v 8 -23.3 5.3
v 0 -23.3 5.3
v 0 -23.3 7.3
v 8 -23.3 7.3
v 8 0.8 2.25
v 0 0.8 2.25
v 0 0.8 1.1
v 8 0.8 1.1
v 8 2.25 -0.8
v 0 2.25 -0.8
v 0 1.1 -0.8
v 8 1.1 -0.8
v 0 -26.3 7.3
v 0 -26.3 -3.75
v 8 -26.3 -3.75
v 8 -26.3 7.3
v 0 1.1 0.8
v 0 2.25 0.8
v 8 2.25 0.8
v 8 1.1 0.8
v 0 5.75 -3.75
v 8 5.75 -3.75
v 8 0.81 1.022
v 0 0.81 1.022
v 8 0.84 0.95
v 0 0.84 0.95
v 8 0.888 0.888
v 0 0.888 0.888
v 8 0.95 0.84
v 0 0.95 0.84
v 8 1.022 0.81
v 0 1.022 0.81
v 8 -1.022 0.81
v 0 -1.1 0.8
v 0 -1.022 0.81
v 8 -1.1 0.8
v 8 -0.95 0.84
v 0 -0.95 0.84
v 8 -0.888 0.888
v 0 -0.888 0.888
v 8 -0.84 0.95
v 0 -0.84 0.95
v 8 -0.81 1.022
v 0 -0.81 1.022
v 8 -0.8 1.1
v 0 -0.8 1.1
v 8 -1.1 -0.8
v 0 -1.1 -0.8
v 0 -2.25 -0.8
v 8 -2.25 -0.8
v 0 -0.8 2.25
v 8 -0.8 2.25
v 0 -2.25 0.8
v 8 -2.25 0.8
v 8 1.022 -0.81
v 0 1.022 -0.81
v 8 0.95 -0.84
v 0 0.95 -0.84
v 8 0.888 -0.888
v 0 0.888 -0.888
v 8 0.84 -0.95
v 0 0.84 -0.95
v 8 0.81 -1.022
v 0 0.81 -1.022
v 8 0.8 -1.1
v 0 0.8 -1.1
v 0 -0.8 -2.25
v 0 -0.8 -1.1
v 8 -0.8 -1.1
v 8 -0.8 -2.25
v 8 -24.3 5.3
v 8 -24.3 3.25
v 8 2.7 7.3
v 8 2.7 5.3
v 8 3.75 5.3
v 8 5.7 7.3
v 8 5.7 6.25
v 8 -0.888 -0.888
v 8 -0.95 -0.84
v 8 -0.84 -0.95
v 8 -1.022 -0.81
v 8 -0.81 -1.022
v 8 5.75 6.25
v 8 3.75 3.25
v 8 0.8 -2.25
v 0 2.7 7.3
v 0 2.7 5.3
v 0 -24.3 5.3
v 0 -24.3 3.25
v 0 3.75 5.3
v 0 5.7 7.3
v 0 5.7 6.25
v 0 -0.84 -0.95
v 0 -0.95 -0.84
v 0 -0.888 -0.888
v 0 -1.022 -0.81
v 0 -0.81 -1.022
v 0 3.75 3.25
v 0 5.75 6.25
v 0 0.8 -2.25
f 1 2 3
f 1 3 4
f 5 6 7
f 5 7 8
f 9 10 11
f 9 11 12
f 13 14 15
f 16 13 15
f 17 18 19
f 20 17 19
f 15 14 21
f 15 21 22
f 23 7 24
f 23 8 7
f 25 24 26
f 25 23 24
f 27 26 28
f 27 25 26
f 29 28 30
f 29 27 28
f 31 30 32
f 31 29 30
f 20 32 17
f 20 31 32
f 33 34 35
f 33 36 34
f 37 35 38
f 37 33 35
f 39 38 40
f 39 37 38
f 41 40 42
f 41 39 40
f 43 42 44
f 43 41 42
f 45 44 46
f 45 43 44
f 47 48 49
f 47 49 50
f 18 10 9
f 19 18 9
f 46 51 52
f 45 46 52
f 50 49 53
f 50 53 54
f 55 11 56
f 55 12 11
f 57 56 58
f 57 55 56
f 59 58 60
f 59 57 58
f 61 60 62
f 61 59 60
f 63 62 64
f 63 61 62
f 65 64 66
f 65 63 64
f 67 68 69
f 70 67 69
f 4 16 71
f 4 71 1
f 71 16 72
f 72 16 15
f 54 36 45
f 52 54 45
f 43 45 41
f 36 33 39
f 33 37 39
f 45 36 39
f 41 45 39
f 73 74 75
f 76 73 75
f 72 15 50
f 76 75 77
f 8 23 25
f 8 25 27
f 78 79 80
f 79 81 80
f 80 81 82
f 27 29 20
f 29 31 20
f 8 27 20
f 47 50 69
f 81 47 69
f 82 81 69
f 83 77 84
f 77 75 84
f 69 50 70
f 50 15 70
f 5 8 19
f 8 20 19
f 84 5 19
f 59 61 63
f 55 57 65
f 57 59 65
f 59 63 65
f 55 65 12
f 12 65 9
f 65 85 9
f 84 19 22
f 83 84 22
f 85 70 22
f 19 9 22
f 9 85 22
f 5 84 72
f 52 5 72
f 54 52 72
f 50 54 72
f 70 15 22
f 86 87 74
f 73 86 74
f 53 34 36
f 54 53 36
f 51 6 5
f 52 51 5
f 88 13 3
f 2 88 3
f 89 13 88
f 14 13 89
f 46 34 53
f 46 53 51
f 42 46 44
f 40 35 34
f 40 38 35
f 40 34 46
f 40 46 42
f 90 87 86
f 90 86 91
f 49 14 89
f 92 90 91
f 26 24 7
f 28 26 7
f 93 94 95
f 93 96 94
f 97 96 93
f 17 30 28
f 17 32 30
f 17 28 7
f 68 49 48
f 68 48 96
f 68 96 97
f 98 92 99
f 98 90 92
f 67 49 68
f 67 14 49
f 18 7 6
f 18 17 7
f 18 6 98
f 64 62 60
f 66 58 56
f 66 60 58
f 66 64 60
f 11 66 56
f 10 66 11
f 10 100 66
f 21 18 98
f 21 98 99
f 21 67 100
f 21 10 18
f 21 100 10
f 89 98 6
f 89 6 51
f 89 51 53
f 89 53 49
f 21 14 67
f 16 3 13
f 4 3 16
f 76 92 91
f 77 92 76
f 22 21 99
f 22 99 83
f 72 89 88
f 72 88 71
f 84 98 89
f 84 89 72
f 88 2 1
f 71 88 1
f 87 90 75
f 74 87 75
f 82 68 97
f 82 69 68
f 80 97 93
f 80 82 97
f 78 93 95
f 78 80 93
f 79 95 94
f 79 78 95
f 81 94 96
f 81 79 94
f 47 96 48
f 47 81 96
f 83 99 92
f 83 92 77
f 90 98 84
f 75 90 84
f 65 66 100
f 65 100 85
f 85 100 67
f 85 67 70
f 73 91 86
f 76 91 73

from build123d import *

# Parameters (mm, degrees)
BOX005_W     = 8
BOX005_H     = 3
BOX005_DEPTH = 2
BOX001_W     = 80
BOX001_H     = 4.5
BOX001_DEPTH = 1.6
BOX_W        = 80
BOX_H        = 4.5
BOX_DEPTH    = 1.6
BOX002_W     = 8
BOX002_H     = 7.5
BOX002_DEPTH = 7
FILLET_R     = 0.3
BOX003_W     = 8
BOX003_H     = 2
BOX003_DEPTH = 10
BOX006_W     = 8
BOX006_H     = 21
BOX006_DEPTH = 7
BOX007_W     = 8
BOX007_H     = 3
BOX007_DEPTH = 2
BOX008_W     = 8
BOX008_H     = 2
BOX008_DEPTH = 10


with BuildPart() as cube005:
    # Box005 → Box005 (new body)
    with BuildSketch(Plane(origin=(0, 2.7, 5.3), x_dir=(1, 0, 0), z_dir=(0, 0, 1))):
        with Locations((4, 1.5)):
            Rectangle(BOX005_W, BOX005_H)
    extrude(amount=BOX005_DEPTH)


with BuildPart() as cube001:
    # Box001 → Box001 (new body)
    with BuildSketch(Plane(origin=(0, 0.8, -2.25), x_dir=(1, 0, 0), z_dir=(0, -1, 0))):
        with Locations((40, 2.25)):
            Rectangle(BOX001_W, BOX001_H)
    extrude(amount=BOX001_DEPTH)


with BuildPart() as fusion:
    # Box → Box (new body)
    with BuildSketch(Plane(origin=(0, -2.25, -0.8), x_dir=(1, 0, 0), z_dir=(0, 0, 1))):
        with Locations((40, 2.25)):
            Rectangle(BOX_W, BOX_H)
    extrude(amount=BOX_DEPTH)

    # Fusion: union Cube001
    add(cube001.part)


with BuildPart() as fusion_1:
    # Fusion placement: moved
    add(fusion.part.moved(Location((-5, 0, 0))))


with BuildPart() as fillet_body:
    # Box002 → Box002 (new body)
    with BuildSketch(Plane(origin=(0, -3.75, -3.75), x_dir=(1, 0, 0), z_dir=(0, 0, 1))):
        with Locations((4, 3.75)):
            Rectangle(BOX002_W, BOX002_H)
    extrude(amount=BOX002_DEPTH)

    # Cut: cut Fusion
    add(fusion_1.part, mode=Mode.SUBTRACT)

    # Fillet
    fillet_edges = [fillet_body.edges().sort_by_distance(p)[0] for p in [
        (4, -0.8, 0.8),
        (4, -0.8, -0.8),
        (4, 0.8, -0.8),
        (4, 0.8, 0.8),
    ]]
    fillet(fillet_edges, radius=FILLET_R)


with BuildPart() as fusion001:
    # Box003 → Box003 (new body)
    with BuildSketch(Plane(origin=(0, 3.75, -3.75), x_dir=(1, 0, 0), z_dir=(0, 0, 1))):
        with Locations((4, 1)):
            Rectangle(BOX003_W, BOX003_H)
    extrude(amount=BOX003_DEPTH)

    # Fusion001: union Cube005, Fillet body
    add(cube005.part)
    add(fillet_body.part)


with BuildPart() as fusion002:
    # Box006 → Box006 (new body)
    with BuildSketch(Plane(origin=(0, -24.3, -3.75), x_dir=(1, 0, 0), z_dir=(0, 0, 1))):
        with Locations((4, 10.5)):
            Rectangle(BOX006_W, BOX006_H)
    extrude(amount=BOX006_DEPTH)

    # Fusion002: union Fusion001
    add(fusion001.part)


with BuildPart() as cube007:
    # Box007 → Box007 (new body)
    with BuildSketch(Plane(origin=(0, -26.3, 5.3), x_dir=(1, 0, 0), z_dir=(0, 0, 1))):
        with Locations((4, 1.5)):
            Rectangle(BOX007_W, BOX007_H)
    extrude(amount=BOX007_DEPTH)


with BuildPart() as fusion004:
    # Box008 → Box008 (new body)
    with BuildSketch(Plane(origin=(0, -26.3, -3.75), x_dir=(1, 0, 0), z_dir=(0, 0, 1))):
        with Locations((4, 1)):
            Rectangle(BOX008_W, BOX008_H)
    extrude(amount=BOX008_DEPTH)

    # Fusion003: union Cube007
    add(cube007.part)

    # Fusion004: union Fusion002
    add(fusion002.part)


solid = fusion004.part
